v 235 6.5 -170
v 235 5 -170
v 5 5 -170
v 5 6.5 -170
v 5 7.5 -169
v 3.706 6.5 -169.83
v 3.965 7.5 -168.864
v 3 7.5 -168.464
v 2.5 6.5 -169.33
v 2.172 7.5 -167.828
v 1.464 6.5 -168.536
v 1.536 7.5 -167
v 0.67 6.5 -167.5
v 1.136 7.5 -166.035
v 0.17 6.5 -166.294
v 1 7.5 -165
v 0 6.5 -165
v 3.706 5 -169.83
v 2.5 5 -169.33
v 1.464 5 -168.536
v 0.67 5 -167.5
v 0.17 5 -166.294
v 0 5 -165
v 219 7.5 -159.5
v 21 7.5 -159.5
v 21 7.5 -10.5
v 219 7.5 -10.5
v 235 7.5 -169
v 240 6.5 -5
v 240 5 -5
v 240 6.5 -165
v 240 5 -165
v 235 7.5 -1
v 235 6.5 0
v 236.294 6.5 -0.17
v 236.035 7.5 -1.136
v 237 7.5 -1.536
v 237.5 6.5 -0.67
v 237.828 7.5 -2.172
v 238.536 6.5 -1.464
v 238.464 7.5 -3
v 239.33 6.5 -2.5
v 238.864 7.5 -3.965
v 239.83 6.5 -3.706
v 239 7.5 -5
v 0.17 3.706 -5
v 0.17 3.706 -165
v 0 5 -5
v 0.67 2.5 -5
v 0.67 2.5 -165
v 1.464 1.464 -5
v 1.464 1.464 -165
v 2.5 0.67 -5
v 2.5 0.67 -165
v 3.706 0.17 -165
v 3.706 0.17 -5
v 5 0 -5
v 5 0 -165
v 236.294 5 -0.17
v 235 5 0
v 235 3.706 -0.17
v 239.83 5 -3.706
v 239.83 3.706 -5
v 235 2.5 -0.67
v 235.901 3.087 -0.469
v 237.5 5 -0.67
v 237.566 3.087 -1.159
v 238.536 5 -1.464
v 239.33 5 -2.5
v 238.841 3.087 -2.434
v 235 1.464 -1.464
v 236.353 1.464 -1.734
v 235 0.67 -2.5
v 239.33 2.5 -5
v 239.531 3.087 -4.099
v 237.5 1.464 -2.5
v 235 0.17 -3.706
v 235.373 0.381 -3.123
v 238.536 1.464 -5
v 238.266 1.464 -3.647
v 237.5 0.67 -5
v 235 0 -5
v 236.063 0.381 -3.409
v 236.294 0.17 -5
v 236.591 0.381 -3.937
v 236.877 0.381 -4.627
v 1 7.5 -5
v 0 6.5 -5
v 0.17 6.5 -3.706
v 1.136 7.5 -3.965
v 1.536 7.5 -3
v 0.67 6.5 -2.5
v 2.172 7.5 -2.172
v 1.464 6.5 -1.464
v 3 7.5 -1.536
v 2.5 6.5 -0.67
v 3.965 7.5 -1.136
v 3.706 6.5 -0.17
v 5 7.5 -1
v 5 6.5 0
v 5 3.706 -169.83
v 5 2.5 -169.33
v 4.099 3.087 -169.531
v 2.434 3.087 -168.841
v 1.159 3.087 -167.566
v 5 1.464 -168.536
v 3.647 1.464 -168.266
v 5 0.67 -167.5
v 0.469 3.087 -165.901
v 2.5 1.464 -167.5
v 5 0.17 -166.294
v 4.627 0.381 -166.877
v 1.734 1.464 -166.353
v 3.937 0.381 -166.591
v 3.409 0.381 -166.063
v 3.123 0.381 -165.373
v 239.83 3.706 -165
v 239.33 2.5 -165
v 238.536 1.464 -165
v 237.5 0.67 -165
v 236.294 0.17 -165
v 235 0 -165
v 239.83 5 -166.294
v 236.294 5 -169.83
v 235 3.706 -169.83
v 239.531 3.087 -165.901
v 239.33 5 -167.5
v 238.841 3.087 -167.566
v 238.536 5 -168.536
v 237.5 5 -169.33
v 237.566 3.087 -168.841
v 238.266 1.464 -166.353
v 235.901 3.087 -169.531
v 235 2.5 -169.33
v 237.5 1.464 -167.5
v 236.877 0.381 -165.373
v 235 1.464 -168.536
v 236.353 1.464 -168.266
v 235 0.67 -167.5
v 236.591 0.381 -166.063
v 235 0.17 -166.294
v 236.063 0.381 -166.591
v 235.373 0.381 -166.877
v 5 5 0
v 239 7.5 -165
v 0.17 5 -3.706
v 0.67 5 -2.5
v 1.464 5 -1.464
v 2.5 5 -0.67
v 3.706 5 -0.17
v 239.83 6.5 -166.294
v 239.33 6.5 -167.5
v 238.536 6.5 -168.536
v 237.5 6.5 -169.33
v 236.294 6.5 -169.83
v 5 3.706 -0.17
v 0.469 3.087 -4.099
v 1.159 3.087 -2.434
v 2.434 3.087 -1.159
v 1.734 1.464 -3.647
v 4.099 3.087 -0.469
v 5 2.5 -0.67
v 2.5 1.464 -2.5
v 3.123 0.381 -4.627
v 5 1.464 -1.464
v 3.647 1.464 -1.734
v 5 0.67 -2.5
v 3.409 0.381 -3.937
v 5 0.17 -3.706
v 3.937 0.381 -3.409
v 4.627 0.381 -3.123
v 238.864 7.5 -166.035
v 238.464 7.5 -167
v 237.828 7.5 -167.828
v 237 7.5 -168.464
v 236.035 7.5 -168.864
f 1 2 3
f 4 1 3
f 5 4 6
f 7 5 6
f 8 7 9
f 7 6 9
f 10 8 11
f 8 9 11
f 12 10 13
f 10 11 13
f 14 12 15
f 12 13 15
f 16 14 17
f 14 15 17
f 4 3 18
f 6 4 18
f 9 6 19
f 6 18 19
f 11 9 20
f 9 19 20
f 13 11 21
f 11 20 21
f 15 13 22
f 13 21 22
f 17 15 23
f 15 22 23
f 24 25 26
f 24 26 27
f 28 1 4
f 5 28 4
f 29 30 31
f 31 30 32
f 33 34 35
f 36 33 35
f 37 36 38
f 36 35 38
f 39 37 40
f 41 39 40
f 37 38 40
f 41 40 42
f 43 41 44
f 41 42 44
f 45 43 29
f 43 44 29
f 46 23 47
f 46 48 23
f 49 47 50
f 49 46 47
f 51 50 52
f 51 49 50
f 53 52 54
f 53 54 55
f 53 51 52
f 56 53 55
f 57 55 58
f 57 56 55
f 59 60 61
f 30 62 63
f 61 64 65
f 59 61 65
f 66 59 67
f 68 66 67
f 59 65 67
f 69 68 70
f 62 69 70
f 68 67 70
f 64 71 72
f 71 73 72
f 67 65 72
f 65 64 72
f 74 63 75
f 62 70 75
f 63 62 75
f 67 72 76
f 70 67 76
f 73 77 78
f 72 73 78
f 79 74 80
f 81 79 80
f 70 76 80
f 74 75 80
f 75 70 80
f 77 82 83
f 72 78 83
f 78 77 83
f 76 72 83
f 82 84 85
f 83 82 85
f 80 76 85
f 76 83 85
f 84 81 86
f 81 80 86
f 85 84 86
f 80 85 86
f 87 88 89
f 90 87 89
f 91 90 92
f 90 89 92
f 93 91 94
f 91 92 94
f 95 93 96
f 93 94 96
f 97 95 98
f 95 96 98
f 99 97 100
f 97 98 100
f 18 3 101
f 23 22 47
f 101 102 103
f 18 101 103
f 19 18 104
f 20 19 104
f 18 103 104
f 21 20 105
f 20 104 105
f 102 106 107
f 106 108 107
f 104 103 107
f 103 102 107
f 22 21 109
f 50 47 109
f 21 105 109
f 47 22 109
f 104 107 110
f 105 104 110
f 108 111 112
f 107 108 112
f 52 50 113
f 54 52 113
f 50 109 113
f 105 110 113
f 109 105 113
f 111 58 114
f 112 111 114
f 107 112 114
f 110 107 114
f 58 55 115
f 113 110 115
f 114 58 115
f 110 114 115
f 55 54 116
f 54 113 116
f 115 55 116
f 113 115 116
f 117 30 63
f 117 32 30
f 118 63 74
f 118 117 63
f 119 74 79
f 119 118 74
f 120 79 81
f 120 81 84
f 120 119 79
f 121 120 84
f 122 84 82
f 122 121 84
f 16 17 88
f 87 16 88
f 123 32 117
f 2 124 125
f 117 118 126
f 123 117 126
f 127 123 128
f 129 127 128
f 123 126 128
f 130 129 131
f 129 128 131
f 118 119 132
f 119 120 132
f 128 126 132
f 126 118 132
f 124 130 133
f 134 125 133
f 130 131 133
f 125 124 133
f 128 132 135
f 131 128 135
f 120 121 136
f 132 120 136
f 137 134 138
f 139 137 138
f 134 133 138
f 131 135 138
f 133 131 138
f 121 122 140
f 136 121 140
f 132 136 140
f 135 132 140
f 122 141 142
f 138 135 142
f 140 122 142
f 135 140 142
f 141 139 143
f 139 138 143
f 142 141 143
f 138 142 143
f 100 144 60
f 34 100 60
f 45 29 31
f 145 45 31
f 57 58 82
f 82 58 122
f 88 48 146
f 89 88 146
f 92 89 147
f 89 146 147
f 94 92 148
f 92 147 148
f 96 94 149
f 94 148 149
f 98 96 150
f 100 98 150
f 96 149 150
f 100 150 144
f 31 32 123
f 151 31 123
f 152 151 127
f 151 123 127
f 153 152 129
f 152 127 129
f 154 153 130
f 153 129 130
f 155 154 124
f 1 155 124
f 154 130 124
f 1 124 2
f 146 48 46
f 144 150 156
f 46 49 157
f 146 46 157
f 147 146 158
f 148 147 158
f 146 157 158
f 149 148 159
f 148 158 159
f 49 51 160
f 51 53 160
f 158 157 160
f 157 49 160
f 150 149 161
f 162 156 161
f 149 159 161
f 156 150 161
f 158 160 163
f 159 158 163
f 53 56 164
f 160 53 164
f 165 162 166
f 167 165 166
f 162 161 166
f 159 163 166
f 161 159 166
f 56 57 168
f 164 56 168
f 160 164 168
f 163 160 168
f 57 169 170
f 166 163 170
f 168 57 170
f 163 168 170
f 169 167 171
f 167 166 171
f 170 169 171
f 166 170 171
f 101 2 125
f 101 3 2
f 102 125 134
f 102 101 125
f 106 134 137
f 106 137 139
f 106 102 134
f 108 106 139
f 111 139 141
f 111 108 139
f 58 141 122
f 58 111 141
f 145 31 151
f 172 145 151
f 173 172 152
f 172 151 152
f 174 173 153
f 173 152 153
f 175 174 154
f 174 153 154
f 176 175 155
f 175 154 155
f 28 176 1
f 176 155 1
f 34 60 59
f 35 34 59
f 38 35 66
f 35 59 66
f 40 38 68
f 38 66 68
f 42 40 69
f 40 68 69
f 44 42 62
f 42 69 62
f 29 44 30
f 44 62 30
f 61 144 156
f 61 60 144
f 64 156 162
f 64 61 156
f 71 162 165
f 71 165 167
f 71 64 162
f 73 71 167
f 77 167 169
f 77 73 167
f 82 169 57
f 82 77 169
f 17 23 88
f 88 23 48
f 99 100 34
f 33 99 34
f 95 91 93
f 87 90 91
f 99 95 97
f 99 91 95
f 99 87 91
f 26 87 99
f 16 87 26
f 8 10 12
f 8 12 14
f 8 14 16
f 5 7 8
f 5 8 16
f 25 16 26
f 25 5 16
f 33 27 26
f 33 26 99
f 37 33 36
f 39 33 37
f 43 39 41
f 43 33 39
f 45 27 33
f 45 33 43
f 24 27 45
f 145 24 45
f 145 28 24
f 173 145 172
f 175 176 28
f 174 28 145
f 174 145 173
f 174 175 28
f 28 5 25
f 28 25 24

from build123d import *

# Parameters (mm, degrees)
BOSS_EXTRUDE1_DEPTH = 7.5
FILLET1_R           = 5
CHAMFER1_SIZE       = 1
SKETCH2_W           = 198
SKETCH2_H           = 149
CUT_EXTRUDE1_DEPTH  = 0.0001


with BuildPart() as part:
    # Sketch1 → Boss-Extrude1 (new body)
    with BuildSketch(Plane(origin=(0, 0, 0), x_dir=(1, 0, 0), z_dir=(0, 1, 0))):
        with BuildLine():
            Line((5, 0), (235, 0))
            ThreePointArc((235, 0), (238.535533906, 1.464466094), (240, 5))
            Line((240, 5), (240, 165))
            ThreePointArc((240, 165), (238.535533906, 168.535533906), (235, 170))
            Line((235, 170), (5, 170))
            ThreePointArc((5, 170), (1.464466094, 168.535533906), (0, 165))
            Line((0, 165), (0, 5))
            ThreePointArc((0, 5), (1.464466094, 1.464466094), (5, 0))
        make_face()
    extrude(amount=BOSS_EXTRUDE1_DEPTH)

    # Fillet1
    fillet1_edges = [part.edges().sort_by_distance(p)[0] for p in [
        (120, 0, 0),
        (1.464466094, 0, -1.464466094),
        (0, 0, -85),
        (1.464466094, 0, -168.535533906),
        (120, 0, -170),
        (238.535533906, 0, -168.535533906),
        (240, 0, -85),
        (238.535533906, 0, -1.464466094),
    ]]
    fillet(fillet1_edges, radius=FILLET1_R)

    # Chamfer1
    chamfer1_edges = [part.edges().sort_by_distance(p)[0] for p in [
        (238.535533906, 7.5, -1.464466094),
        (240, 7.5, -85),
        (238.535533906, 7.5, -168.535533906),
        (120, 7.5, -170),
        (1.464466094, 7.5, -168.535533906),
        (0, 7.5, -85),
        (1.464466094, 7.5, -1.464466094),
        (120, 7.5, 0),
    ]]
    chamfer(chamfer1_edges, length=CHAMFER1_SIZE)

    # Sketch2 → Cut-Extrude1 (cut)
    with BuildSketch(Plane(origin=(0, 7.5, 0), x_dir=(1, 0, 0), z_dir=(0, 1, 0))):
        with Locations((120, 85)):
            Rectangle(SKETCH2_W, SKETCH2_H)
    extrude(amount=-CUT_EXTRUDE1_DEPTH, mode=Mode.SUBTRACT)


solid = part.part
